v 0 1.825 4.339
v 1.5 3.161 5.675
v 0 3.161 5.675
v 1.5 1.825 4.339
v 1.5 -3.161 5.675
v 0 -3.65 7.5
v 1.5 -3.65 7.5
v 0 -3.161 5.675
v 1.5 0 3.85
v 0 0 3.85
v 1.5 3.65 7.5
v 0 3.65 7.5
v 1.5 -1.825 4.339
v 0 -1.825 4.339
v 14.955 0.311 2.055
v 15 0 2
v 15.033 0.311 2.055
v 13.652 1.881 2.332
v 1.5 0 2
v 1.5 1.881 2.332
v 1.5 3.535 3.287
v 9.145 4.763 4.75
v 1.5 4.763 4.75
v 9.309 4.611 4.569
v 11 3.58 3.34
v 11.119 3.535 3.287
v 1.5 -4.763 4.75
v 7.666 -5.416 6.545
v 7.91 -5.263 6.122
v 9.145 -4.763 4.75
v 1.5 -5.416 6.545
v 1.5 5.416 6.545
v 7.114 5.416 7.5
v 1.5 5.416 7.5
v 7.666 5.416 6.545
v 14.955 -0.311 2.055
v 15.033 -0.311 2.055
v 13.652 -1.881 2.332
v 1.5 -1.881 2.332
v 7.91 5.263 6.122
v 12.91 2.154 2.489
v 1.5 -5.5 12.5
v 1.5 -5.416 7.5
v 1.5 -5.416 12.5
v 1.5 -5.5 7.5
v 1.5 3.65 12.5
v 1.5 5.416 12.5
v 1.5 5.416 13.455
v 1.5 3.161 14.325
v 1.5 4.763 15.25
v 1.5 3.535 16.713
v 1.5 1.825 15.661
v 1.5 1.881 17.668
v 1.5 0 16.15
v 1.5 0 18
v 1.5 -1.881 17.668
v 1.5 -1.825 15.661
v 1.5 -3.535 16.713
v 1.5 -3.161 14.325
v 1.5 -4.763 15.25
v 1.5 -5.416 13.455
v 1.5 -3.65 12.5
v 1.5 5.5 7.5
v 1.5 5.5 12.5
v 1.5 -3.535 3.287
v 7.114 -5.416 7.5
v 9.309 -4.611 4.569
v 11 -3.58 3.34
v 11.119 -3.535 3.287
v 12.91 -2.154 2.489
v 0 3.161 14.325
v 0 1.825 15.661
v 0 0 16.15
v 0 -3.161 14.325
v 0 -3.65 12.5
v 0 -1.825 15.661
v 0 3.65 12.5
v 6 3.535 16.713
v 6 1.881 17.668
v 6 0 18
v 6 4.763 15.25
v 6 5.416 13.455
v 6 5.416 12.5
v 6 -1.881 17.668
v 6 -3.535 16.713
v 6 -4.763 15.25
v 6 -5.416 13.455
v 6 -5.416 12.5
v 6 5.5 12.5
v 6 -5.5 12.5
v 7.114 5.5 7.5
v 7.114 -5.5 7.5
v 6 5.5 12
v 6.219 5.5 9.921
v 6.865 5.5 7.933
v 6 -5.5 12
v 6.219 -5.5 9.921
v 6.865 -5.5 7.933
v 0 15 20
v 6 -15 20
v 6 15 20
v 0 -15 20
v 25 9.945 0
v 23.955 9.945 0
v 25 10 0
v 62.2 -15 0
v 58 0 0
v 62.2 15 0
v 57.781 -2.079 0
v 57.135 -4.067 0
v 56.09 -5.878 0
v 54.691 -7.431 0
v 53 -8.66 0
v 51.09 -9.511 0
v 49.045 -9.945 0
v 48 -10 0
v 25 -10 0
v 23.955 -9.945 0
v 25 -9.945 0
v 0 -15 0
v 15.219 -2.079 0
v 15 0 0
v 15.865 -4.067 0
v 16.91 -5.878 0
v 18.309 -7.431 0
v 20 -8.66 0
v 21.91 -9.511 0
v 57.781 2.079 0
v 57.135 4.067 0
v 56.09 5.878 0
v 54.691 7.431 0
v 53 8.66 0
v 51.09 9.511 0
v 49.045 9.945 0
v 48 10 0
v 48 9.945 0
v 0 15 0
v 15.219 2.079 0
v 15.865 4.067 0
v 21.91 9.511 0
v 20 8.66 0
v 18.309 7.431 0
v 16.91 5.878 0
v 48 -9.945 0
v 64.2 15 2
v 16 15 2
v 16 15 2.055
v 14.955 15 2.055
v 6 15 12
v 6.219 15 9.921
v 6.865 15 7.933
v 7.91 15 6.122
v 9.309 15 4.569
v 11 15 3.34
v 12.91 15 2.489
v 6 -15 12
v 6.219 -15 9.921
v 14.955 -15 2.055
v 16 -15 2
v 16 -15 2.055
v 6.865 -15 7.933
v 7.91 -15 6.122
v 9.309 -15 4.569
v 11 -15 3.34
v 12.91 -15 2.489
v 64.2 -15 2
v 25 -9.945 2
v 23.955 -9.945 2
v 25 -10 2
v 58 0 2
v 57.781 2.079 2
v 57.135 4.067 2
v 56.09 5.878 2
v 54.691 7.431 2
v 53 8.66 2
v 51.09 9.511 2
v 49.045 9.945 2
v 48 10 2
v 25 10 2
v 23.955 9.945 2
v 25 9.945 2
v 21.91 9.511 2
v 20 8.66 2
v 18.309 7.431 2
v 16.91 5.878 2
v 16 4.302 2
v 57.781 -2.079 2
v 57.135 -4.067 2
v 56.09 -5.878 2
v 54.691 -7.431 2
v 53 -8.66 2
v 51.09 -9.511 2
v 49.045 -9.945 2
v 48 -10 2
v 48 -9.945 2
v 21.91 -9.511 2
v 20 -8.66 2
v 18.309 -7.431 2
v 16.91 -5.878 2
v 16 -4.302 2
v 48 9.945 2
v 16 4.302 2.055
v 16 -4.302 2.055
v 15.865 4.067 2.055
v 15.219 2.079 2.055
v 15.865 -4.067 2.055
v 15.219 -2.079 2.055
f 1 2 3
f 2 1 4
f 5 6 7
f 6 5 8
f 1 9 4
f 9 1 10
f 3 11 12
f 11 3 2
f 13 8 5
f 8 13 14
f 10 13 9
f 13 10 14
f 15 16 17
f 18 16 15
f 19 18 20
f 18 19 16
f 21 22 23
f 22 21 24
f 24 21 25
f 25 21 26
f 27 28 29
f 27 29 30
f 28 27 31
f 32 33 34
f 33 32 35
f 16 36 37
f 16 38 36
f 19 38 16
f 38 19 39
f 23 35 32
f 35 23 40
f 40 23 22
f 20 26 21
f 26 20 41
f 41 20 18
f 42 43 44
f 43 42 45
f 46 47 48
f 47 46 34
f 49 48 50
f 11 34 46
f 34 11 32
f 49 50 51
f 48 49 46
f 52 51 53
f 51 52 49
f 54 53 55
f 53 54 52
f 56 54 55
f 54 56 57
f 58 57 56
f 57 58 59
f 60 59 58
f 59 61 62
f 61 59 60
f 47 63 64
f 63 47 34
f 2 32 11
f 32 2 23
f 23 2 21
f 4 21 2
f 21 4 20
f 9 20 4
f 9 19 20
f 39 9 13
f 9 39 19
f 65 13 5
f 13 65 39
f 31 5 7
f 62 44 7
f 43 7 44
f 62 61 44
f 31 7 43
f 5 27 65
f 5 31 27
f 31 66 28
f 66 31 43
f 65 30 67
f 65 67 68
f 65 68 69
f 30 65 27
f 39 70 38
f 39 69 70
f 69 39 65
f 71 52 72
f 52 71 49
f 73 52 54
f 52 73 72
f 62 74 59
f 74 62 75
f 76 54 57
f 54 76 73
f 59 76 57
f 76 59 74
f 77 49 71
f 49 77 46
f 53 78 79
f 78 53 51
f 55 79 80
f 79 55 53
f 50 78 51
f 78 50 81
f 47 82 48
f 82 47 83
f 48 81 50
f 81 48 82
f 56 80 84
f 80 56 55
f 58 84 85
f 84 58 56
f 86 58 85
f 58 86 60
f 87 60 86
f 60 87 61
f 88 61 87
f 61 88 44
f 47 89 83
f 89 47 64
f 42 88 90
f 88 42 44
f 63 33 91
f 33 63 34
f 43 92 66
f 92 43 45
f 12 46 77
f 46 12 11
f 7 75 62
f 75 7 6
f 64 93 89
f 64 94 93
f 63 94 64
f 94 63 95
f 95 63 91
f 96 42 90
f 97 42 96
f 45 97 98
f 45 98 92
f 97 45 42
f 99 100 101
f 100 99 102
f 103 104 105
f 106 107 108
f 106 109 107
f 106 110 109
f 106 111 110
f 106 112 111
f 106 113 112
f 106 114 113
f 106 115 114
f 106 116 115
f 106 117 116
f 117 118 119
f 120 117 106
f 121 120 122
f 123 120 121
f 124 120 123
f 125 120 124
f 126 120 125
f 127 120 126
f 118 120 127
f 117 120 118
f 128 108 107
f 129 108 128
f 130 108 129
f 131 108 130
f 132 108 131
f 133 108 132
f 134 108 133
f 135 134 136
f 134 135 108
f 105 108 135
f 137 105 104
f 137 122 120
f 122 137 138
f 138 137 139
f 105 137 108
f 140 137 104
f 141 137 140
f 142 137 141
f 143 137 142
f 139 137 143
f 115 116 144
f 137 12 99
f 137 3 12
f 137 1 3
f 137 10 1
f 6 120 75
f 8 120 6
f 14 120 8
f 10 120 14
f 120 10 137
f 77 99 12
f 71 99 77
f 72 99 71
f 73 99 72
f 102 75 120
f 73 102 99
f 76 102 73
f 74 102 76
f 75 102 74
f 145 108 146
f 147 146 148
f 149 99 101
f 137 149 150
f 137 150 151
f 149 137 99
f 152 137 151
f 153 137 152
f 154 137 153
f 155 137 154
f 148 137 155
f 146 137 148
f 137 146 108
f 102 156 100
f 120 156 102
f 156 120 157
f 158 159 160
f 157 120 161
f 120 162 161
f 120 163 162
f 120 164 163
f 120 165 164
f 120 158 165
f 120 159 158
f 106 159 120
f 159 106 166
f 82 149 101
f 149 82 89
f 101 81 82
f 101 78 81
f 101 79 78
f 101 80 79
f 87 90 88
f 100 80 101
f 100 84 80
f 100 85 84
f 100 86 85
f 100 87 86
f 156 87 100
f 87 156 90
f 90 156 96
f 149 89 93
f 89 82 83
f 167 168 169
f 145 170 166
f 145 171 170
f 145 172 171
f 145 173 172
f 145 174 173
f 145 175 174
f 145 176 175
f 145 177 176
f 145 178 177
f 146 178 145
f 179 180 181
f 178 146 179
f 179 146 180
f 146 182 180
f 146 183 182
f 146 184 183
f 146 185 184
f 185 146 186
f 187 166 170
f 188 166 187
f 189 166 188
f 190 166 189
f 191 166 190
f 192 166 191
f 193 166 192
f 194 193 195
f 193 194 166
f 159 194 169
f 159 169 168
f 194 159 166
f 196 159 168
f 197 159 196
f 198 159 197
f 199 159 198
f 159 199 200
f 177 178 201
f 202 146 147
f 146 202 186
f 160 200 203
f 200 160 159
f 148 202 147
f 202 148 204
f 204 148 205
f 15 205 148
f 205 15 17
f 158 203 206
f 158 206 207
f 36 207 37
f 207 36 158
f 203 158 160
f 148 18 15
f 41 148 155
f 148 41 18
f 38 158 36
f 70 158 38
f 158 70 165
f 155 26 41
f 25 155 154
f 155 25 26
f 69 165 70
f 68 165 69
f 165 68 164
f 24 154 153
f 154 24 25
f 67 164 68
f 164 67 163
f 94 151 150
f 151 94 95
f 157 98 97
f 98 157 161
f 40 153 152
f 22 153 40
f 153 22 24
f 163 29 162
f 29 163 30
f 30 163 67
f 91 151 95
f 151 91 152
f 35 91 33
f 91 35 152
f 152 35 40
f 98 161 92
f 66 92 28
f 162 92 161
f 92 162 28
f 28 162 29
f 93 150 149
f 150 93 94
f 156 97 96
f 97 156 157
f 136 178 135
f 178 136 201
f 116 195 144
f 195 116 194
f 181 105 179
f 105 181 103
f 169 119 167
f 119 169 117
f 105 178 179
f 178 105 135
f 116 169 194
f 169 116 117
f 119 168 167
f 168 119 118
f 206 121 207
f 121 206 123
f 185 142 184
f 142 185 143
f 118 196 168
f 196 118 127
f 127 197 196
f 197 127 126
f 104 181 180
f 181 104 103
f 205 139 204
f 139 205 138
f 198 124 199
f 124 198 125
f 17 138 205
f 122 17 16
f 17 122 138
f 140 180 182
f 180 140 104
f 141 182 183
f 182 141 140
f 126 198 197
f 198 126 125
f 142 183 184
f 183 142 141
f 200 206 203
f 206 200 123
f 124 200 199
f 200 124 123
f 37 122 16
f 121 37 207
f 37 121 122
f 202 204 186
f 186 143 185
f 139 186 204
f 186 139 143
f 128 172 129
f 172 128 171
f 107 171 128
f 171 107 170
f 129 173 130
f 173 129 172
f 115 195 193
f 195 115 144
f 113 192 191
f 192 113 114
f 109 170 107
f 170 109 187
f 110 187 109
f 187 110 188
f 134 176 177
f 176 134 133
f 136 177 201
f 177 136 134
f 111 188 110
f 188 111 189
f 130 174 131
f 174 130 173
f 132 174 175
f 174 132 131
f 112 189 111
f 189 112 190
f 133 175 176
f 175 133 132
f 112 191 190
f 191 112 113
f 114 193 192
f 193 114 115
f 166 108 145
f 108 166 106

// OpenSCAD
// TODO: measure size of head
module drillhole(hole=7.3, 
		head=11, adjust=6) {

	translate([-adjust/2,0,-20]) {
		cylinder(h=30, r=hole/2);
		cylinder(h=20, r=head/2);
	}
	translate([adjust/2,0,-20]) { 
		cylinder(h=30, r=hole/2);
		cylinder(h=20, r=head/2);
	}
	translate([-adjust/2,-hole/2, -20])
		cube([adjust,hole,30]);

	translate([-adjust/2,-head/2, -20])
		cube([adjust,head,20]);
}


module catch(
	width=30,
 	length=65,
	springh=2,
	fillet=10,
	slotw=20) {


	translate([0, -width/2,0])
	difference() {
		cube([length, width, 20]);
		translate([6, -1, springh+fillet])
		cube([length, width+2, 20]);
		translate([6 + fillet, -1, springh])
		cube([length, width+2, 20]);

		// fillet
		translate([fillet+6,width+1,fillet+springh])	
		rotate([90,0,0])
		cylinder(r=10, h=width+2);

		// Drill hole
		translate([1.50, 4/8*width,10])
		rotate([0,-90, 0])
		drillhole(adjust=5);

		// slot
		translate([15+slotw/2, (width-slotw)/2, -1])
		cube([length-22-slotw, slotw, 20]); 

		translate([15+slotw/2, width/2, -1])
		cylinder(r=slotw/2, h=20);
		translate([length-7-slotw/2, width/2, -1])
		cylinder(r=slotw/2, h=20);
	
		// chamfer

		translate([length-springh*1.4,-1,0])
		rotate([0,45,0])
		cube([20, width+2, 20]) ;
	}



}

// z0 is the top of the screwhead
module countersink(clearance=4, 
		head=7) {
	translate([0,0,-10])
	cylinder(r=clearance/2, h=20);
	cylinder(r=head/2,h=10);
	translate([0,0,clearance-head])
	cylinder(r1=clearance/2, r2=head/2,head-clearance);

}

module hook(width=15, 
		height=10, 
		length=15) {

	difference() {
		union() {
			cylinder(r1=width/2-1, r2=width/2, height);
			translate([0, -3.5,0])
			cube([30,7,height]);
		}
		translate([0,0,height-2])
		countersink();

		// chamfer on ramp
		translate([5,-10,10])
		rotate([0,45,0])
		cube([30,20,20]);
	}
}

catch();
//hook();
